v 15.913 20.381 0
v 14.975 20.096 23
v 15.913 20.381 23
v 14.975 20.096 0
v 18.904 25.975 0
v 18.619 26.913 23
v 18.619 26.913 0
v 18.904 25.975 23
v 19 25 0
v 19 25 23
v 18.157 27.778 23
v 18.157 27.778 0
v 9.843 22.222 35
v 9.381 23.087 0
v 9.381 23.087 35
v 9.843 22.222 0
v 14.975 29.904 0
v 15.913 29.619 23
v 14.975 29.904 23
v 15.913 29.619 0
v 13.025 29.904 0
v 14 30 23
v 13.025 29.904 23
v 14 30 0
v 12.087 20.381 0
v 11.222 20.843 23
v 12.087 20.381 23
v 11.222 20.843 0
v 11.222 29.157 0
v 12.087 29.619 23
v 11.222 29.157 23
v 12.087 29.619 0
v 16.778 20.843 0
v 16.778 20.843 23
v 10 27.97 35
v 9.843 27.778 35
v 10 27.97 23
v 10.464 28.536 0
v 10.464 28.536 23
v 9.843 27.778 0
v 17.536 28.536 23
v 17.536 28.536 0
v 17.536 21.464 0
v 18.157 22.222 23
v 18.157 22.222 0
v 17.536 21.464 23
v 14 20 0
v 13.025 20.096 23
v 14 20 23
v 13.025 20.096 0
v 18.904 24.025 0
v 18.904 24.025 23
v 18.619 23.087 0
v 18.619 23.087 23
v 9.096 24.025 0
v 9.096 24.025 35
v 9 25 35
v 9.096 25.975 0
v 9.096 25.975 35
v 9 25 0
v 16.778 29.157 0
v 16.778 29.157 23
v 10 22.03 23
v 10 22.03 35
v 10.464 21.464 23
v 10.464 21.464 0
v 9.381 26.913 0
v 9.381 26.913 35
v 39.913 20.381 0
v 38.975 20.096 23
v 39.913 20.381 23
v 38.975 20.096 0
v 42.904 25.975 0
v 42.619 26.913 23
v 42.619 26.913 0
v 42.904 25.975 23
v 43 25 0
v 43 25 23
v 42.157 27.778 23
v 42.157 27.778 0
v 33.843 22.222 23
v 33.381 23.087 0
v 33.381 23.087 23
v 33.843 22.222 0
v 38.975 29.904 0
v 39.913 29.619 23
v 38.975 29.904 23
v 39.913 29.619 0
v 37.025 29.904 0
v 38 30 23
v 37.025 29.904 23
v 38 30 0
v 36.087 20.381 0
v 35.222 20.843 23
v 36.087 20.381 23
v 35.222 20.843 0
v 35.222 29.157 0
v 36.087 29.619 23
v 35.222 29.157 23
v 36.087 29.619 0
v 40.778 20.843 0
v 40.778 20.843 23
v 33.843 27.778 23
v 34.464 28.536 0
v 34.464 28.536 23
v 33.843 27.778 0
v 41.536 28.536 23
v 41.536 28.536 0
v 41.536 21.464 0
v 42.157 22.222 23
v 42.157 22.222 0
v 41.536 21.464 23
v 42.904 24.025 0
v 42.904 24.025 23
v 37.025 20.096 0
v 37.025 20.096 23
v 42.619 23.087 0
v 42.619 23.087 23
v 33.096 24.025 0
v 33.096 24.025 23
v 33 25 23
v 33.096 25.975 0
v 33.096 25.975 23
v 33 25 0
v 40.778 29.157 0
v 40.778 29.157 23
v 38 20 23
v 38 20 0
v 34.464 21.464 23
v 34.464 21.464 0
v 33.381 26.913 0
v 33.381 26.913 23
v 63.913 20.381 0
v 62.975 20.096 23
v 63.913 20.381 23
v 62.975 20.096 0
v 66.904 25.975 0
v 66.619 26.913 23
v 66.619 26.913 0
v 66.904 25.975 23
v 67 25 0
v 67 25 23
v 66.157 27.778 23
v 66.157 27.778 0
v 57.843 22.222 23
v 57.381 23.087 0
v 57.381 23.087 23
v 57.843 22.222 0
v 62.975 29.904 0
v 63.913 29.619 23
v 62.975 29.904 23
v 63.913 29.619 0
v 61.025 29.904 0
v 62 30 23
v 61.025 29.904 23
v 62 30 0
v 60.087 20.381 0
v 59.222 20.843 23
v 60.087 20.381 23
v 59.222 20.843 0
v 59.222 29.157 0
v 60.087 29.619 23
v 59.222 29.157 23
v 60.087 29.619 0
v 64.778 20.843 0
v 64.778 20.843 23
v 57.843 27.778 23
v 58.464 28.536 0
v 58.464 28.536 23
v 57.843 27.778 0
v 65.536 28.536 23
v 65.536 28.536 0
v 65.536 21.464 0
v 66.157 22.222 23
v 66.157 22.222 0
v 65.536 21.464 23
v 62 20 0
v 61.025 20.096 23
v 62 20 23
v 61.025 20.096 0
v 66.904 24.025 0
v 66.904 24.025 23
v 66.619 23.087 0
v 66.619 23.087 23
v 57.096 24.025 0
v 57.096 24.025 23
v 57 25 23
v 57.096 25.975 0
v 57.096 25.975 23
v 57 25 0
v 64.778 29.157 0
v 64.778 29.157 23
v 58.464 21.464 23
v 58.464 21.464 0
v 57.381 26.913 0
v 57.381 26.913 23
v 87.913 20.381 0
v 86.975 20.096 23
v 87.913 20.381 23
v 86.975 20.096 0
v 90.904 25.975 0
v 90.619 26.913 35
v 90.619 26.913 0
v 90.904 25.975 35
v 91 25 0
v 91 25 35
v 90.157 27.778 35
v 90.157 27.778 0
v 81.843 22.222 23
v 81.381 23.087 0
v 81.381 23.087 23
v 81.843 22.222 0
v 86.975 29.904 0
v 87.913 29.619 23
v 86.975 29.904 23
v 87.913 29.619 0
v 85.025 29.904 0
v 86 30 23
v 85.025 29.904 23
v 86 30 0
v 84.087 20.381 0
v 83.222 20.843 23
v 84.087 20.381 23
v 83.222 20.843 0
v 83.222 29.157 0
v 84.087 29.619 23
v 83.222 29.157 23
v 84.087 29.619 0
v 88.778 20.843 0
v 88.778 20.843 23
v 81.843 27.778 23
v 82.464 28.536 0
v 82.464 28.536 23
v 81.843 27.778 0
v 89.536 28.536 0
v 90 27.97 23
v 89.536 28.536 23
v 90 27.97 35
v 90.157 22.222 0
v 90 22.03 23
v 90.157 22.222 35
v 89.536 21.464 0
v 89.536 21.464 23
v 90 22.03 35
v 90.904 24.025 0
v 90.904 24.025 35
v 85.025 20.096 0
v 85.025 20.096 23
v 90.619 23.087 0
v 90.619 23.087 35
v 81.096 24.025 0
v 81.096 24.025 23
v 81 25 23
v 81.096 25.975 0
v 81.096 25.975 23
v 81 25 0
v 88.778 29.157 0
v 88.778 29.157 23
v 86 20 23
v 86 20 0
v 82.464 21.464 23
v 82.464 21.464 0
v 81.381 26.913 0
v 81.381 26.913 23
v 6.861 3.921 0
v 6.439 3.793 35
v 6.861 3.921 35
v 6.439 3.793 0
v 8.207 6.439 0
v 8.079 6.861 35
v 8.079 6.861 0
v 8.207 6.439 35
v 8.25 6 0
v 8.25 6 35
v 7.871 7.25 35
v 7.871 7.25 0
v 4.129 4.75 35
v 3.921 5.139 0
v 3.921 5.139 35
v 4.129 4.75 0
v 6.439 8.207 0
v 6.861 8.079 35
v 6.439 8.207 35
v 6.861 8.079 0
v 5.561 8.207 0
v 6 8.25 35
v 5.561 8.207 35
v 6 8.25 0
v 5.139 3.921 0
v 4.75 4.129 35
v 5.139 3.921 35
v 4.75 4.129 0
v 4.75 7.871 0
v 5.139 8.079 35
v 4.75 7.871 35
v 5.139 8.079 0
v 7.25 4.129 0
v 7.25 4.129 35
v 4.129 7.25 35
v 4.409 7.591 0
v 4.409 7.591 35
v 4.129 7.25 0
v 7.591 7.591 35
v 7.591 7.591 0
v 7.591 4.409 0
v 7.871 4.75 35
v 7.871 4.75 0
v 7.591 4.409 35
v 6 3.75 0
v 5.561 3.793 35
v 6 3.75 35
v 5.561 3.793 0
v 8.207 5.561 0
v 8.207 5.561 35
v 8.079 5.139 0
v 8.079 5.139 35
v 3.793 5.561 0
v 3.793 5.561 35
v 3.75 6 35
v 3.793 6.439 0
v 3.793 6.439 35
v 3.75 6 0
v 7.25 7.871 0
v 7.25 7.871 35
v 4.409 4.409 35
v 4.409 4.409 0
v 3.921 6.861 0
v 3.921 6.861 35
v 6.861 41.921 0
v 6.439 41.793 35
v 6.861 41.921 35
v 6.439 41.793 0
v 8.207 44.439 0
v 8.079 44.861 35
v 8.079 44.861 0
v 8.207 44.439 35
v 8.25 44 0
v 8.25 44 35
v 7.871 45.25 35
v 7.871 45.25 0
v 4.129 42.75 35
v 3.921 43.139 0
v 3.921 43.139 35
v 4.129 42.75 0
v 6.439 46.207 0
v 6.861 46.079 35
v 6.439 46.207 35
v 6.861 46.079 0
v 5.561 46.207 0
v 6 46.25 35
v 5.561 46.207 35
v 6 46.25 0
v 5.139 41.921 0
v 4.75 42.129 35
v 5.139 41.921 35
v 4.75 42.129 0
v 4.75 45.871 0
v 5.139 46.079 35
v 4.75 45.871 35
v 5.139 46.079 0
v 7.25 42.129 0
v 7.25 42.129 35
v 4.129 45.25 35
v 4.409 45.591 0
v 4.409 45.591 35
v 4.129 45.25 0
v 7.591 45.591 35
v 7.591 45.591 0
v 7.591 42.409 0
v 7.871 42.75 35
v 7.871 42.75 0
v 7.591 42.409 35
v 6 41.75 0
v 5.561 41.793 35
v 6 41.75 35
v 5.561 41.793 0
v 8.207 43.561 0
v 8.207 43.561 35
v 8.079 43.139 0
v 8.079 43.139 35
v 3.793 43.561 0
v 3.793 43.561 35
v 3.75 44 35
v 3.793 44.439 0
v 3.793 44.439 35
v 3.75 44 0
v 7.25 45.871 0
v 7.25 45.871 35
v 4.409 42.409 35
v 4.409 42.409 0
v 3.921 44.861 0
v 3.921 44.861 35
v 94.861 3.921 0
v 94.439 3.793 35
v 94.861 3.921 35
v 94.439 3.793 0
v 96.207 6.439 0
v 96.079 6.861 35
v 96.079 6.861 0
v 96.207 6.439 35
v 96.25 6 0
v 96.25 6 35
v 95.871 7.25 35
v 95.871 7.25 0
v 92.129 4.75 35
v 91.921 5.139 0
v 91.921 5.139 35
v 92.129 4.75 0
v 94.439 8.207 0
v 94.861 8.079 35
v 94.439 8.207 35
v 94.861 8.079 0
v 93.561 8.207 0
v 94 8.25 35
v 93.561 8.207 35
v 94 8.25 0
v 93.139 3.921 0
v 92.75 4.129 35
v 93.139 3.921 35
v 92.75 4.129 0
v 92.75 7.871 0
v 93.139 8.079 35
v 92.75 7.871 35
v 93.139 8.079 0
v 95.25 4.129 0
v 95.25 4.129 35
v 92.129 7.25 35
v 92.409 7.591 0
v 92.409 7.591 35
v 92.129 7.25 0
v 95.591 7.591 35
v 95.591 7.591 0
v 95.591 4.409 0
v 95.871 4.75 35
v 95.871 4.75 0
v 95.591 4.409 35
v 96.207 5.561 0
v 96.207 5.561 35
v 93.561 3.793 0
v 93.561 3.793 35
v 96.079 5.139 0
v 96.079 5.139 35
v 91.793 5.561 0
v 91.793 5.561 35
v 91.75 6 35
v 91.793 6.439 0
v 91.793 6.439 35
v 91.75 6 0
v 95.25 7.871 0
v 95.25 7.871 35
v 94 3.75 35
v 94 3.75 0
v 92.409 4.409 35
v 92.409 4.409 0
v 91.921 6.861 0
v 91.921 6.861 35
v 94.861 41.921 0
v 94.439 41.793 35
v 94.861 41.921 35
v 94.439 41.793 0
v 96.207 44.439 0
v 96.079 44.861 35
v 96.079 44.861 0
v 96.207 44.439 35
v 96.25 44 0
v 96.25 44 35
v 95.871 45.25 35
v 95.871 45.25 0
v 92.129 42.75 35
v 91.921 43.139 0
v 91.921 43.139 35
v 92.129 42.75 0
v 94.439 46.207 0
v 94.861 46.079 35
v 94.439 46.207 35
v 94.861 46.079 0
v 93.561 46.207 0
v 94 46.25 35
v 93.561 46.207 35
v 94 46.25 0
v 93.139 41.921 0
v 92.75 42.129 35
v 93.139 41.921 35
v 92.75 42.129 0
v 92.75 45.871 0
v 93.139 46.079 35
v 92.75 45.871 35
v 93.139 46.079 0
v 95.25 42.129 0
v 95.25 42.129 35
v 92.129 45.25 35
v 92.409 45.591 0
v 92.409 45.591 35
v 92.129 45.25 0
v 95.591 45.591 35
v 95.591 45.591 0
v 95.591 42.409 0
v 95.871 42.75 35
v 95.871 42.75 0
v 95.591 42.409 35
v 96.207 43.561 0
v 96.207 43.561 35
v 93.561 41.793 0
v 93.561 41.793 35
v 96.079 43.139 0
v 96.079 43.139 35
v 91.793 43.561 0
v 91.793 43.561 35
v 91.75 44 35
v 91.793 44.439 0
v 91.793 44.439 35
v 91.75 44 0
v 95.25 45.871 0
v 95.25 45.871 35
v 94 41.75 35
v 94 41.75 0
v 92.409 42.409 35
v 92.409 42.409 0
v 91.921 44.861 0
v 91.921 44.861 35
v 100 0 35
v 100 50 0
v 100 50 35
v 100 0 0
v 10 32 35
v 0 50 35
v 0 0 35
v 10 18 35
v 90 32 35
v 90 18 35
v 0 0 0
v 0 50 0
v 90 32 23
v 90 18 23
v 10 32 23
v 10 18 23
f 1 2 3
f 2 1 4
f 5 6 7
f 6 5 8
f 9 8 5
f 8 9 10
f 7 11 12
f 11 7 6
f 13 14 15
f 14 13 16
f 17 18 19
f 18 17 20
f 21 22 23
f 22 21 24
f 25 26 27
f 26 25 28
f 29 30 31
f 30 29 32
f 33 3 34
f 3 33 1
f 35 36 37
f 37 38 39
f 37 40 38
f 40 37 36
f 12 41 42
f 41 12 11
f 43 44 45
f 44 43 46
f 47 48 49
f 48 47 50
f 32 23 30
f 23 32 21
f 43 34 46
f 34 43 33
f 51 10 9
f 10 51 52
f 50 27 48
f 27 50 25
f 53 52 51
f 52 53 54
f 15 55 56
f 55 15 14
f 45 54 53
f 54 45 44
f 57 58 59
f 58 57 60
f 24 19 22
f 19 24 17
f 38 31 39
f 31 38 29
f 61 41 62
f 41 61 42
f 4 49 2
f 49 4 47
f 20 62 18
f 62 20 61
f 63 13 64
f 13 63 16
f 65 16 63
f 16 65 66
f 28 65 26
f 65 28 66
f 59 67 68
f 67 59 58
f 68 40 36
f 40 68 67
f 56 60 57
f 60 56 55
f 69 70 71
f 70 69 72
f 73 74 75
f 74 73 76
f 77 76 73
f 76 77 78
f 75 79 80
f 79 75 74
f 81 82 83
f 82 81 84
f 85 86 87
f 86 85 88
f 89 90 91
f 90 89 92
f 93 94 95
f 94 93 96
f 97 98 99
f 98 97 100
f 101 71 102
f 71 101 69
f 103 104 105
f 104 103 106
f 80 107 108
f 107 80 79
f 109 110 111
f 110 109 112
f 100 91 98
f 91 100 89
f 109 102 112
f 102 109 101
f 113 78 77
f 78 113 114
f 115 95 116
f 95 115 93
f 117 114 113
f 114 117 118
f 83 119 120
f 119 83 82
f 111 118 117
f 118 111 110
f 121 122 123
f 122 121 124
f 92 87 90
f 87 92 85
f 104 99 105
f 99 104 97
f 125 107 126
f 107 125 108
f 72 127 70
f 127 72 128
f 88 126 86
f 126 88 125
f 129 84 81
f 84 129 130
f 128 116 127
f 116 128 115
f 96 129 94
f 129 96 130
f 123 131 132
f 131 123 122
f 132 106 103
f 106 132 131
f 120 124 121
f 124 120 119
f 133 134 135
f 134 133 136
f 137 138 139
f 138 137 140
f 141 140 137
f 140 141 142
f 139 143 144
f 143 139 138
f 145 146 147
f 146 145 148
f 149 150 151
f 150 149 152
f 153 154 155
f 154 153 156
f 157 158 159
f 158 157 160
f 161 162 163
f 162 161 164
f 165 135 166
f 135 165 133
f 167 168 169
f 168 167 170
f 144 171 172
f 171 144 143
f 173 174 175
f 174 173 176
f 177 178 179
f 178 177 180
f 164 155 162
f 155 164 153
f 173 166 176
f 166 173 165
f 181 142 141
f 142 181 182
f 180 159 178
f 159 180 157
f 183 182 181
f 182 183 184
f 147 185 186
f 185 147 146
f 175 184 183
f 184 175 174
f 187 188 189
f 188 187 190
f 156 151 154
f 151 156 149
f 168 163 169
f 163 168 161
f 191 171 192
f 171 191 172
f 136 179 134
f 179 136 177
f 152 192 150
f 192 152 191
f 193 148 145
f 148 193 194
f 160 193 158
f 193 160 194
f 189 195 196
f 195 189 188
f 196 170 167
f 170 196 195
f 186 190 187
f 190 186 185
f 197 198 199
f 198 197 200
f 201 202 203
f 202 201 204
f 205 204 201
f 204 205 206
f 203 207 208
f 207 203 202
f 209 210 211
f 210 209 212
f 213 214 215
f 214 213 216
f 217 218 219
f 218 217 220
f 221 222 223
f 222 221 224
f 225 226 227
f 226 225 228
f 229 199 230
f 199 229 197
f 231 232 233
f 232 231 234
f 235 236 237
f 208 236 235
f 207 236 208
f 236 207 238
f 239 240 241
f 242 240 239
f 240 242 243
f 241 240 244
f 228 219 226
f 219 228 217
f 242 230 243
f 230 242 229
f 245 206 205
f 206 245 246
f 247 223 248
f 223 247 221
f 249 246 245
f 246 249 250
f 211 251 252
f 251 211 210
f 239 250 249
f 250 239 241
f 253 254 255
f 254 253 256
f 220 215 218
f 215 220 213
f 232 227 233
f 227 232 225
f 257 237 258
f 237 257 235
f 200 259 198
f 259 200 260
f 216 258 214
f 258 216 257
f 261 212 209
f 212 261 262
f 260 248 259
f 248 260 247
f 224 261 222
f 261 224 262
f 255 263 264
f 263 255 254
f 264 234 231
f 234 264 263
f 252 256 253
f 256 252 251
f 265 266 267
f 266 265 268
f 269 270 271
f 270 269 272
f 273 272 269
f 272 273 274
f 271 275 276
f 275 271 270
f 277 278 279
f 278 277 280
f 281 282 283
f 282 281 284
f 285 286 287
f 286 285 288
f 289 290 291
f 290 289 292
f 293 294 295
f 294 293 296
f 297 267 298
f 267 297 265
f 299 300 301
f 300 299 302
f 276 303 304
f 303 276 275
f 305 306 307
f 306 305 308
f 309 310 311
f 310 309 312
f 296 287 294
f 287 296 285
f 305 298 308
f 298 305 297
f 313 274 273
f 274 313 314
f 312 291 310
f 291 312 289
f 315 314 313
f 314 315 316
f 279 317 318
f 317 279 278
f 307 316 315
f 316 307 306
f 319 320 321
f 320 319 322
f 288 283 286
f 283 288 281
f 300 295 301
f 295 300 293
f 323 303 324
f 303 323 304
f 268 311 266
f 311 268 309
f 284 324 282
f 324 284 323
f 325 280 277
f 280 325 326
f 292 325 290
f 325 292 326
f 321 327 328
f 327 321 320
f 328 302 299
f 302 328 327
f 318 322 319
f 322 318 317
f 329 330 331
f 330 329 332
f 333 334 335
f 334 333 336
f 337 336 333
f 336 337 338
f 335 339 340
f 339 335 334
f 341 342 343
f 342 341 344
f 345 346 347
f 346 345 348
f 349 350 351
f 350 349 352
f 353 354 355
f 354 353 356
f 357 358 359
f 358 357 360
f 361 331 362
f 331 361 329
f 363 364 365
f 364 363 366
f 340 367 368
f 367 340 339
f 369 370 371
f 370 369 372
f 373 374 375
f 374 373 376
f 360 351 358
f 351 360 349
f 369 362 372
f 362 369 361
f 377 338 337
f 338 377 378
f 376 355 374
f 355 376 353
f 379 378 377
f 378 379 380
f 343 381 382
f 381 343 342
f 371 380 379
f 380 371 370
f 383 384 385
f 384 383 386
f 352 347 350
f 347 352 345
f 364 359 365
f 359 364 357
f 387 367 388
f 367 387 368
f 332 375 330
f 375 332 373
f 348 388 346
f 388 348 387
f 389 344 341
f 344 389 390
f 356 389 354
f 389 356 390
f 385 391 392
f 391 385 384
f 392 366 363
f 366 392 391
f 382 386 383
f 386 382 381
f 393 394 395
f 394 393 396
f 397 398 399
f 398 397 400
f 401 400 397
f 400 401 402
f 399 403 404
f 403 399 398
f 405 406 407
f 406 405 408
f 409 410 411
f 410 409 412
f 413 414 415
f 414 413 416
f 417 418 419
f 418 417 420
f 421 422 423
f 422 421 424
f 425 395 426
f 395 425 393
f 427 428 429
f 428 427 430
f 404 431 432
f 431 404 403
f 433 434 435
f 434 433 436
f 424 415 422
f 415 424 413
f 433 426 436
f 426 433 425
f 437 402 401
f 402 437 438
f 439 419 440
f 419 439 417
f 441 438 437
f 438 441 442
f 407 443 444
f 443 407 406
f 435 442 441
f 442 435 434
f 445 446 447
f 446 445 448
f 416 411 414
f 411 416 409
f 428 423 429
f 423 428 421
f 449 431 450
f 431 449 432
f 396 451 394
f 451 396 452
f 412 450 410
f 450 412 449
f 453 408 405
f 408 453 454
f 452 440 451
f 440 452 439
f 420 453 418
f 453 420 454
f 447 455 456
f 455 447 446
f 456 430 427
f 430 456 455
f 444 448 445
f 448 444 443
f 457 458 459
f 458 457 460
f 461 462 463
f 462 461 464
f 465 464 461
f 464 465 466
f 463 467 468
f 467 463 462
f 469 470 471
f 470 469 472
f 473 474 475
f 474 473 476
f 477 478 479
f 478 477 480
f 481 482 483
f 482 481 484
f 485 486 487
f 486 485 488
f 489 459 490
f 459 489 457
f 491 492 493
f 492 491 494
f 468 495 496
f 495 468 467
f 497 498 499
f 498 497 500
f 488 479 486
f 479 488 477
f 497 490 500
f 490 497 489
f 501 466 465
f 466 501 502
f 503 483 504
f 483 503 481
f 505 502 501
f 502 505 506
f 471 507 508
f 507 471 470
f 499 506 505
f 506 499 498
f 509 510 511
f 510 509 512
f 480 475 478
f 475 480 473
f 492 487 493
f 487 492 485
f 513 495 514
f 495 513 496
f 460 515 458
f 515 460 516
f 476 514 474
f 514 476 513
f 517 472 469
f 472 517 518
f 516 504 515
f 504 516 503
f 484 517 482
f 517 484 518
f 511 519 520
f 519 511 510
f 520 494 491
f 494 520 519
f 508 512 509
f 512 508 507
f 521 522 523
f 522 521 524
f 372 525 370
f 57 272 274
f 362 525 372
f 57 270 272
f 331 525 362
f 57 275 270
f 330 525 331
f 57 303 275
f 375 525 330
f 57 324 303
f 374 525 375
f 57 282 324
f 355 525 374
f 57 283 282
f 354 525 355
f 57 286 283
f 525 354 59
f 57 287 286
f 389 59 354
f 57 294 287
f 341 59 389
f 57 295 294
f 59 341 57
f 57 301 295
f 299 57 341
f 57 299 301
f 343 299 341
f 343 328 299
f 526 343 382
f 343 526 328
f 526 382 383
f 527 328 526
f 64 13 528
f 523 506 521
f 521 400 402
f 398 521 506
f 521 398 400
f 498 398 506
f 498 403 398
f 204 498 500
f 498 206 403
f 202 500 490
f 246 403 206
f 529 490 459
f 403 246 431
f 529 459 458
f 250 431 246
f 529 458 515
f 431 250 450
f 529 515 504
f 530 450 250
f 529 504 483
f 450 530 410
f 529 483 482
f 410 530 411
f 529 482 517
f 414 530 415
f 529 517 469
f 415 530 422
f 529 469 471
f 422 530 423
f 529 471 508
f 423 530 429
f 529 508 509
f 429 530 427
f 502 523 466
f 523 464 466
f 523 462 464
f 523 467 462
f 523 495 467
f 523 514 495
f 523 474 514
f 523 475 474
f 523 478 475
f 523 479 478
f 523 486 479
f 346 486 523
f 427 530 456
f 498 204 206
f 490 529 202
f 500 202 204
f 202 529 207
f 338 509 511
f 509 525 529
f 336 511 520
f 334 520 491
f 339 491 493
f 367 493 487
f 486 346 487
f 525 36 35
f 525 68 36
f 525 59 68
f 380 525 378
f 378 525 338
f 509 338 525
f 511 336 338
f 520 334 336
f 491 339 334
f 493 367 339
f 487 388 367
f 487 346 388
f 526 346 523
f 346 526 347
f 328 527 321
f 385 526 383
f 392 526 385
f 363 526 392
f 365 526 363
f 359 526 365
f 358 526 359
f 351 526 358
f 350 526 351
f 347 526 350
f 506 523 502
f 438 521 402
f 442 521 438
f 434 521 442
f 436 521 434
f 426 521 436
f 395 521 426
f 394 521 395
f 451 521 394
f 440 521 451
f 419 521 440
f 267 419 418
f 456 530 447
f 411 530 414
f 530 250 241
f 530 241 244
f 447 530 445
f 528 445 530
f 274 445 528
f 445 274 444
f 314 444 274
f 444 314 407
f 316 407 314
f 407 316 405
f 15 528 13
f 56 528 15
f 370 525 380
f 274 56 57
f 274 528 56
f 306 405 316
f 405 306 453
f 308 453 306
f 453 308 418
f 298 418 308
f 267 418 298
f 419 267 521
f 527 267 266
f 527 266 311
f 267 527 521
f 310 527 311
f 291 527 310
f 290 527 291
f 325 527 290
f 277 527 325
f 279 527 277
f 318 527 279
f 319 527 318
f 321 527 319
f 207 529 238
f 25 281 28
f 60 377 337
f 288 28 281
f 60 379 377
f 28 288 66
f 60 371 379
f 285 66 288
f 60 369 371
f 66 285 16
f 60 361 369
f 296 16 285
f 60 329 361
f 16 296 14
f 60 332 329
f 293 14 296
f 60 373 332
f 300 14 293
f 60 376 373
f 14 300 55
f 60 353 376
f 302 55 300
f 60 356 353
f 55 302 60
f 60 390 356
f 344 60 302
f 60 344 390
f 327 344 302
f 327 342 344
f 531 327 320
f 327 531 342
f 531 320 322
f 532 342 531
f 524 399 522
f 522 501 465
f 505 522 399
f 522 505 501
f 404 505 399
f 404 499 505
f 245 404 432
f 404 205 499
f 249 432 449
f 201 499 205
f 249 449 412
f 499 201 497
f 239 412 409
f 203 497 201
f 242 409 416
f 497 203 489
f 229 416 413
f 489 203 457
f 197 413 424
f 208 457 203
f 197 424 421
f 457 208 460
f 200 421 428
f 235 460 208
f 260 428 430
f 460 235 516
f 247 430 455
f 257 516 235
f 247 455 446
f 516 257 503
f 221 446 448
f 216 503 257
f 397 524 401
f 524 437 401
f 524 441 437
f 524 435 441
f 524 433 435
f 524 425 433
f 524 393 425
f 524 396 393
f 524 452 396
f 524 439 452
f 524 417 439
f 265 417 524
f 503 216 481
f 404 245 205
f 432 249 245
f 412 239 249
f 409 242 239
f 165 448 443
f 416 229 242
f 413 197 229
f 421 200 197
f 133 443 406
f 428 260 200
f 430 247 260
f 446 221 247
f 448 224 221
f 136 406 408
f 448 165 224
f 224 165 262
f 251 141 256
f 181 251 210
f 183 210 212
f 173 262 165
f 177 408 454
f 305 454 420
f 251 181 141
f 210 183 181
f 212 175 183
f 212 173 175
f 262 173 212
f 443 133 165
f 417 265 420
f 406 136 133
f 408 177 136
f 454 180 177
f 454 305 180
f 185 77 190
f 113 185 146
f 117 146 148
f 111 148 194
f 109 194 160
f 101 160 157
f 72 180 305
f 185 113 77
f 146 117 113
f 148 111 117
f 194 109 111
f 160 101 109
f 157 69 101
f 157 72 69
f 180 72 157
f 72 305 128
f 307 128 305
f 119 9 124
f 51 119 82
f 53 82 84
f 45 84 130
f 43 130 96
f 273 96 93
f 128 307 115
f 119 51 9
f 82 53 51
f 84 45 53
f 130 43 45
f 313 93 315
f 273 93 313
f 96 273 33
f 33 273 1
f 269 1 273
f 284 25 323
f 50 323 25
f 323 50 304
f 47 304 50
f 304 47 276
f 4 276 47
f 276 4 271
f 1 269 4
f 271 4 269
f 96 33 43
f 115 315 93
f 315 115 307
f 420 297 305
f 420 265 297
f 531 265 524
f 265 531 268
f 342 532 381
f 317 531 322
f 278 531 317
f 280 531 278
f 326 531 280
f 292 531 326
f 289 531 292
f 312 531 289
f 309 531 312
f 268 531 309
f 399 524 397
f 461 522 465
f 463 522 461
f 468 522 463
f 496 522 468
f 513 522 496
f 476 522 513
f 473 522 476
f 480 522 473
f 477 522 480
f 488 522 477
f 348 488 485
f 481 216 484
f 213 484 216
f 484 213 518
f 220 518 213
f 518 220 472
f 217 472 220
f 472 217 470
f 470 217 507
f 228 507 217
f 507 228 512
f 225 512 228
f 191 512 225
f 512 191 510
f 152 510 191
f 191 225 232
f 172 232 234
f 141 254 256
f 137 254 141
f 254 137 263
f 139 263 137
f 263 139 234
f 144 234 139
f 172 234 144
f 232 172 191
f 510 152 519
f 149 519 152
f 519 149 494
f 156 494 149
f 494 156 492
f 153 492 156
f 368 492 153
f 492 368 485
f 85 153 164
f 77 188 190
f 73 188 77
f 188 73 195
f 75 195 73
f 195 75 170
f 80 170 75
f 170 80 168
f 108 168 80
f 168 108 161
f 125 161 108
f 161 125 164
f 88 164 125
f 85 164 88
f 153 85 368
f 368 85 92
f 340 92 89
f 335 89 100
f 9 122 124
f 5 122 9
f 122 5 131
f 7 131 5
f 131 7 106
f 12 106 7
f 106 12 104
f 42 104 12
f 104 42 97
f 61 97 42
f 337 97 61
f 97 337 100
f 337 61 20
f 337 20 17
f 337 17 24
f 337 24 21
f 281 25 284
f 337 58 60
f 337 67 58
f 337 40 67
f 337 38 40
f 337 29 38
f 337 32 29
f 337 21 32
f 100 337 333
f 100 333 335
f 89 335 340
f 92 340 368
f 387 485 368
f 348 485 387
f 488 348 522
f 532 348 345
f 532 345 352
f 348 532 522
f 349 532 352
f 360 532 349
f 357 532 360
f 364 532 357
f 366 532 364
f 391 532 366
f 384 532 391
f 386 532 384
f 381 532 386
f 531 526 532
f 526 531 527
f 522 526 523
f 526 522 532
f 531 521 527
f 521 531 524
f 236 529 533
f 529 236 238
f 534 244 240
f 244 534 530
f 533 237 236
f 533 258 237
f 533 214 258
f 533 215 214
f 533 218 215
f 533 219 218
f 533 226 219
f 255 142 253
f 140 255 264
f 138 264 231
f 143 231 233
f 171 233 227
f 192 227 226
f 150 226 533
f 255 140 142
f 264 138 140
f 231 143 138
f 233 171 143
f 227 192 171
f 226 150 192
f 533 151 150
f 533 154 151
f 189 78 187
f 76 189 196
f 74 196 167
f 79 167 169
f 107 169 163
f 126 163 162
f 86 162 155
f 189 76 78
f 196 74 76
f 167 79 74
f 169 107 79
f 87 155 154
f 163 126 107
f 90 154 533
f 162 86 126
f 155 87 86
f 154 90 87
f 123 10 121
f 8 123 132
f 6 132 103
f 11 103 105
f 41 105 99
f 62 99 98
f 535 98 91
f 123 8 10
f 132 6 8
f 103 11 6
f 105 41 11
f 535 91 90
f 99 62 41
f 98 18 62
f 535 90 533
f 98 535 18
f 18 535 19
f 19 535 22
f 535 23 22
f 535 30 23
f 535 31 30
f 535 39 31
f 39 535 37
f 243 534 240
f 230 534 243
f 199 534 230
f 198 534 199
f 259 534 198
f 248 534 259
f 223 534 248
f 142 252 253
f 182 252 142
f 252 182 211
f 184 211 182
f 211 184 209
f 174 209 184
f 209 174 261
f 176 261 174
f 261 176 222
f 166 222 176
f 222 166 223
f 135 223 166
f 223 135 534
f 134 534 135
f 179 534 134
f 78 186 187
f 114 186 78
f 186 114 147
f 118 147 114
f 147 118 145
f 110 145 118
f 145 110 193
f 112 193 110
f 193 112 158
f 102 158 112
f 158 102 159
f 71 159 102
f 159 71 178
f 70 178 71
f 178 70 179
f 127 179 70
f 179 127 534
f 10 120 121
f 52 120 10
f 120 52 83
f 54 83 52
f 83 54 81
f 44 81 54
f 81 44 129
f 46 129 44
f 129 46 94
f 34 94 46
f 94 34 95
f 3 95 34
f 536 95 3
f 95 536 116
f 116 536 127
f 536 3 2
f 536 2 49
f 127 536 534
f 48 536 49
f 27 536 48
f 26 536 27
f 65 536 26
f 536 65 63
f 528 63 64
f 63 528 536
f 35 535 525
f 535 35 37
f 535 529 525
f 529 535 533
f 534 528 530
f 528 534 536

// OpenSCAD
$fn = 32;

// ----------------------------------------------------------------------
// Manifold block: gallery_top manifold
// ----------------------------------------------------------------------

// --- parameters (mm) ---
block_l = 100;            // block length, X
block_w = 50;             // block width, Y
block_h = 35;             // block height, Z
port_d = 10;              // port bore diameter
port_pitch = 24;          // port pitch along X
gallery_d = 14;           // top gallery width, Y
gallery_depth = 12;       // gallery pocket depth
wall_p = 10;              // gallery end wall thickness, X
mnt_d = 4.5;              // mounting hole diameter
mnt_in = 6;               // mounting hole inset from the edges

n_ports = 4;  // ports in the row
port_x0 = (block_l - (n_ports - 1) * port_pitch) / 2;  // first port X

difference() {
  cube([block_l, block_w, block_h]);
  for (i = [0 : n_ports - 1])
    translate([port_x0 + i * port_pitch, block_w / 2, -1])
      cylinder(h = block_h + 2, d = port_d);
  translate([wall_p, block_w / 2 - gallery_d / 2, block_h - gallery_depth])
    cube([block_l - 2 * wall_p, gallery_d, gallery_depth + 1]);
  for (cx = [mnt_in, block_l - mnt_in])
    for (cy = [mnt_in, block_w - mnt_in])
      translate([cx, cy, -1]) cylinder(h = block_h + 2, d = mnt_d);
}
